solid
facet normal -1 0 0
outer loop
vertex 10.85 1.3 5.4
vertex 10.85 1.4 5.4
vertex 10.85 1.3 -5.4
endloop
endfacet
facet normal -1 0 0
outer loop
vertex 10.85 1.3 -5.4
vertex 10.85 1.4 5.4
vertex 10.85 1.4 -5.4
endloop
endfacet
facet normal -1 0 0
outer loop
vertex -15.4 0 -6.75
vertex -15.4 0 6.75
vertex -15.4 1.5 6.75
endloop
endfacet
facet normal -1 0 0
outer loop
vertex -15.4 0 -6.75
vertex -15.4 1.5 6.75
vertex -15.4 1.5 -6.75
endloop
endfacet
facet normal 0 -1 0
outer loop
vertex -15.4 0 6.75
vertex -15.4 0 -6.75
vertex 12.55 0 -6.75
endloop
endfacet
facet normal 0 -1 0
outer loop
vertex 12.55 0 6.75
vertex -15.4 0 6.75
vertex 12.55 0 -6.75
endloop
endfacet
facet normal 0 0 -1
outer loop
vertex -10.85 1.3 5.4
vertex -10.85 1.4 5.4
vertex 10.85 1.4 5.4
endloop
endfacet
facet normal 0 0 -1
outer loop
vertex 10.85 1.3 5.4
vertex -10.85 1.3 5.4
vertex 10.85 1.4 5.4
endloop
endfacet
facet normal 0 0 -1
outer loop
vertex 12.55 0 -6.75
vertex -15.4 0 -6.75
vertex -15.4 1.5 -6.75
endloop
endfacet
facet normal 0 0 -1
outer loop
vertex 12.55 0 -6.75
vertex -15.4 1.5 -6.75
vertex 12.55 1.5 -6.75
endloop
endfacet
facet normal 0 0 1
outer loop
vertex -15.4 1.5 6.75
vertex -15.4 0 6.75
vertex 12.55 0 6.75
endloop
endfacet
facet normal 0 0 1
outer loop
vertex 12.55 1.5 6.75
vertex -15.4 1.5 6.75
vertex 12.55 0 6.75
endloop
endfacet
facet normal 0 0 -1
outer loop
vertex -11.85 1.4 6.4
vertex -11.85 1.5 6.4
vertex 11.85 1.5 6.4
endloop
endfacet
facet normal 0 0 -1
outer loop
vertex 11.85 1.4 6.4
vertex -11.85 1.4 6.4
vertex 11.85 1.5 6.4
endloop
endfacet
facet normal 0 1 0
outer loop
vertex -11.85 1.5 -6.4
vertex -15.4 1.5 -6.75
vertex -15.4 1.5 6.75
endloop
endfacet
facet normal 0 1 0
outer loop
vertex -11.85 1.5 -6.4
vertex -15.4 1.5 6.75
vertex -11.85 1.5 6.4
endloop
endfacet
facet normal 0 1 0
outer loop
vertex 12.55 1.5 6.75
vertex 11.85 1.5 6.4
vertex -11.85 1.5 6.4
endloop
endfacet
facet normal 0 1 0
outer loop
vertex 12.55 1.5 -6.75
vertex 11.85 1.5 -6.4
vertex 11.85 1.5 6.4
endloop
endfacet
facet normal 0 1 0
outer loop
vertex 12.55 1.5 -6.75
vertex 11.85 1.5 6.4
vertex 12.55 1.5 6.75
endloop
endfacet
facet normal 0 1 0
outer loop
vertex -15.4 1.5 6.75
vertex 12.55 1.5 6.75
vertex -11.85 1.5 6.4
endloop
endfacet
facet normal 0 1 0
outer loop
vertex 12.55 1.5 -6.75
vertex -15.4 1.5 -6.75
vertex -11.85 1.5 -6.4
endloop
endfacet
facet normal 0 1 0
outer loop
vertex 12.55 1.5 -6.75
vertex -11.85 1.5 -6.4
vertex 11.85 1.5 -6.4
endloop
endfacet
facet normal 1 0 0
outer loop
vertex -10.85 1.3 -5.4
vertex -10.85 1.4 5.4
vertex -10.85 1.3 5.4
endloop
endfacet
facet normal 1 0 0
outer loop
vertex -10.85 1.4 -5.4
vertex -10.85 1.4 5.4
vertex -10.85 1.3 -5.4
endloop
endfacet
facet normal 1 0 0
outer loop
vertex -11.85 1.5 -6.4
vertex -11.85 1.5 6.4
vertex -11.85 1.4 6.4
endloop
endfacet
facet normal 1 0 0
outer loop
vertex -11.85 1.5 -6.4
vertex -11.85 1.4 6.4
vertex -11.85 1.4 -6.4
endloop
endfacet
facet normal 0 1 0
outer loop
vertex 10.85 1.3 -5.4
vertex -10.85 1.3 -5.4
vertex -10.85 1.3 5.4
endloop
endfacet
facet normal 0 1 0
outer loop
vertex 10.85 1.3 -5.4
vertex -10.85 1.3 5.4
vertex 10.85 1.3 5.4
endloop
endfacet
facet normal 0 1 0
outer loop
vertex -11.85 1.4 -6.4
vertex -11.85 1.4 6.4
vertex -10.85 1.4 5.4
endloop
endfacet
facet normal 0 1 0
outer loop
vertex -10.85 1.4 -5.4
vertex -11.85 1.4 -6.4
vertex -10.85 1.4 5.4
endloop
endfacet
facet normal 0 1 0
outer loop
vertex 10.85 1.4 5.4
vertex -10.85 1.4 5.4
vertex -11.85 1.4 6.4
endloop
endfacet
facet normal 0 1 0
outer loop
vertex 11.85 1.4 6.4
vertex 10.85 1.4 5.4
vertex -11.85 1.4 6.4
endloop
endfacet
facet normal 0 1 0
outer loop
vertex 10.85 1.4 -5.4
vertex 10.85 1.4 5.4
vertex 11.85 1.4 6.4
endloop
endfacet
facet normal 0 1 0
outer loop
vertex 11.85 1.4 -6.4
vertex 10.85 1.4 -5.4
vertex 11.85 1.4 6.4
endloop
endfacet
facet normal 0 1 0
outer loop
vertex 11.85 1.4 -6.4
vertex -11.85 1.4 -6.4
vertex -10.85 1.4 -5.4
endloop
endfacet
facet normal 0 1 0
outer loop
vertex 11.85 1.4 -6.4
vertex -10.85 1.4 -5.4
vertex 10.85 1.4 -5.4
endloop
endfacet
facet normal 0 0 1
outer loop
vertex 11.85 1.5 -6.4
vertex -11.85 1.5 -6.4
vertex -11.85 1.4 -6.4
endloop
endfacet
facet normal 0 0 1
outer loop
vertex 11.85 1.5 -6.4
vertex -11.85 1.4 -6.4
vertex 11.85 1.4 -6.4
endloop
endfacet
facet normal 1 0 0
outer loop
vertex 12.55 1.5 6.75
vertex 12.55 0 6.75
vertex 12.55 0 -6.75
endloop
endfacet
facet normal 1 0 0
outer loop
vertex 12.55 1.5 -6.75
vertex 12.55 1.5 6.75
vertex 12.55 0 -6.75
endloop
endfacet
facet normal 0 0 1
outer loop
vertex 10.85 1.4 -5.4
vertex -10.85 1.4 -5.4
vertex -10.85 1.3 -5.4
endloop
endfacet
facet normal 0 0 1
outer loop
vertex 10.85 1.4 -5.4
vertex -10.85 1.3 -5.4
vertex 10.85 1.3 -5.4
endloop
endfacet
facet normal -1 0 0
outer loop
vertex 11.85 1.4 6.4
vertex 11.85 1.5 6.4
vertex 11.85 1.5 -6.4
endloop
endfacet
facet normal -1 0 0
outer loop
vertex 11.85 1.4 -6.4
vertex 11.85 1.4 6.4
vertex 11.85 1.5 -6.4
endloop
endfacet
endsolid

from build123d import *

# Parameters (mm, degrees)
SKETCH1_W           = 27.95
SKETCH1_H           = 13.5
BOSS_EXTRUDE1_DEPTH = 1.5
SKETCH2_W           = 21.7
SKETCH2_H           = 10.8
CUT_EXTRUDE1_DEPTH  = 0.2
SKETCH3_W           = 23.7
SKETCH3_H           = 12.8
CUT_EXTRUDE2_DEPTH  = 0.1


with BuildPart() as part:
    # Sketch1 → Boss-Extrude1 (new body)
    with BuildSketch(Plane(origin=(0, 0, 0), x_dir=(1, 0, 0), z_dir=(0, 1, 0))):
        with Locations((-1.425, 0)):
            Rectangle(SKETCH1_W, SKETCH1_H)
    extrude(amount=BOSS_EXTRUDE1_DEPTH)

    # Sketch2 → Cut-Extrude1 (cut)
    with BuildSketch(Plane(origin=(0, 1.5, 0), x_dir=(1, 0, 0), z_dir=(0, 1, 0))):
        Rectangle(SKETCH2_W, SKETCH2_H)
    extrude(amount=-CUT_EXTRUDE1_DEPTH, mode=Mode.SUBTRACT)

    # Sketch3 → Cut-Extrude2 (cut)
    with BuildSketch(Plane(origin=(0, 1.5, 0), x_dir=(1, 0, 0), z_dir=(0, 1, 0))):
        Rectangle(SKETCH3_W, SKETCH3_H)
    extrude(amount=-CUT_EXTRUDE2_DEPTH, mode=Mode.SUBTRACT)


solid = part.part
